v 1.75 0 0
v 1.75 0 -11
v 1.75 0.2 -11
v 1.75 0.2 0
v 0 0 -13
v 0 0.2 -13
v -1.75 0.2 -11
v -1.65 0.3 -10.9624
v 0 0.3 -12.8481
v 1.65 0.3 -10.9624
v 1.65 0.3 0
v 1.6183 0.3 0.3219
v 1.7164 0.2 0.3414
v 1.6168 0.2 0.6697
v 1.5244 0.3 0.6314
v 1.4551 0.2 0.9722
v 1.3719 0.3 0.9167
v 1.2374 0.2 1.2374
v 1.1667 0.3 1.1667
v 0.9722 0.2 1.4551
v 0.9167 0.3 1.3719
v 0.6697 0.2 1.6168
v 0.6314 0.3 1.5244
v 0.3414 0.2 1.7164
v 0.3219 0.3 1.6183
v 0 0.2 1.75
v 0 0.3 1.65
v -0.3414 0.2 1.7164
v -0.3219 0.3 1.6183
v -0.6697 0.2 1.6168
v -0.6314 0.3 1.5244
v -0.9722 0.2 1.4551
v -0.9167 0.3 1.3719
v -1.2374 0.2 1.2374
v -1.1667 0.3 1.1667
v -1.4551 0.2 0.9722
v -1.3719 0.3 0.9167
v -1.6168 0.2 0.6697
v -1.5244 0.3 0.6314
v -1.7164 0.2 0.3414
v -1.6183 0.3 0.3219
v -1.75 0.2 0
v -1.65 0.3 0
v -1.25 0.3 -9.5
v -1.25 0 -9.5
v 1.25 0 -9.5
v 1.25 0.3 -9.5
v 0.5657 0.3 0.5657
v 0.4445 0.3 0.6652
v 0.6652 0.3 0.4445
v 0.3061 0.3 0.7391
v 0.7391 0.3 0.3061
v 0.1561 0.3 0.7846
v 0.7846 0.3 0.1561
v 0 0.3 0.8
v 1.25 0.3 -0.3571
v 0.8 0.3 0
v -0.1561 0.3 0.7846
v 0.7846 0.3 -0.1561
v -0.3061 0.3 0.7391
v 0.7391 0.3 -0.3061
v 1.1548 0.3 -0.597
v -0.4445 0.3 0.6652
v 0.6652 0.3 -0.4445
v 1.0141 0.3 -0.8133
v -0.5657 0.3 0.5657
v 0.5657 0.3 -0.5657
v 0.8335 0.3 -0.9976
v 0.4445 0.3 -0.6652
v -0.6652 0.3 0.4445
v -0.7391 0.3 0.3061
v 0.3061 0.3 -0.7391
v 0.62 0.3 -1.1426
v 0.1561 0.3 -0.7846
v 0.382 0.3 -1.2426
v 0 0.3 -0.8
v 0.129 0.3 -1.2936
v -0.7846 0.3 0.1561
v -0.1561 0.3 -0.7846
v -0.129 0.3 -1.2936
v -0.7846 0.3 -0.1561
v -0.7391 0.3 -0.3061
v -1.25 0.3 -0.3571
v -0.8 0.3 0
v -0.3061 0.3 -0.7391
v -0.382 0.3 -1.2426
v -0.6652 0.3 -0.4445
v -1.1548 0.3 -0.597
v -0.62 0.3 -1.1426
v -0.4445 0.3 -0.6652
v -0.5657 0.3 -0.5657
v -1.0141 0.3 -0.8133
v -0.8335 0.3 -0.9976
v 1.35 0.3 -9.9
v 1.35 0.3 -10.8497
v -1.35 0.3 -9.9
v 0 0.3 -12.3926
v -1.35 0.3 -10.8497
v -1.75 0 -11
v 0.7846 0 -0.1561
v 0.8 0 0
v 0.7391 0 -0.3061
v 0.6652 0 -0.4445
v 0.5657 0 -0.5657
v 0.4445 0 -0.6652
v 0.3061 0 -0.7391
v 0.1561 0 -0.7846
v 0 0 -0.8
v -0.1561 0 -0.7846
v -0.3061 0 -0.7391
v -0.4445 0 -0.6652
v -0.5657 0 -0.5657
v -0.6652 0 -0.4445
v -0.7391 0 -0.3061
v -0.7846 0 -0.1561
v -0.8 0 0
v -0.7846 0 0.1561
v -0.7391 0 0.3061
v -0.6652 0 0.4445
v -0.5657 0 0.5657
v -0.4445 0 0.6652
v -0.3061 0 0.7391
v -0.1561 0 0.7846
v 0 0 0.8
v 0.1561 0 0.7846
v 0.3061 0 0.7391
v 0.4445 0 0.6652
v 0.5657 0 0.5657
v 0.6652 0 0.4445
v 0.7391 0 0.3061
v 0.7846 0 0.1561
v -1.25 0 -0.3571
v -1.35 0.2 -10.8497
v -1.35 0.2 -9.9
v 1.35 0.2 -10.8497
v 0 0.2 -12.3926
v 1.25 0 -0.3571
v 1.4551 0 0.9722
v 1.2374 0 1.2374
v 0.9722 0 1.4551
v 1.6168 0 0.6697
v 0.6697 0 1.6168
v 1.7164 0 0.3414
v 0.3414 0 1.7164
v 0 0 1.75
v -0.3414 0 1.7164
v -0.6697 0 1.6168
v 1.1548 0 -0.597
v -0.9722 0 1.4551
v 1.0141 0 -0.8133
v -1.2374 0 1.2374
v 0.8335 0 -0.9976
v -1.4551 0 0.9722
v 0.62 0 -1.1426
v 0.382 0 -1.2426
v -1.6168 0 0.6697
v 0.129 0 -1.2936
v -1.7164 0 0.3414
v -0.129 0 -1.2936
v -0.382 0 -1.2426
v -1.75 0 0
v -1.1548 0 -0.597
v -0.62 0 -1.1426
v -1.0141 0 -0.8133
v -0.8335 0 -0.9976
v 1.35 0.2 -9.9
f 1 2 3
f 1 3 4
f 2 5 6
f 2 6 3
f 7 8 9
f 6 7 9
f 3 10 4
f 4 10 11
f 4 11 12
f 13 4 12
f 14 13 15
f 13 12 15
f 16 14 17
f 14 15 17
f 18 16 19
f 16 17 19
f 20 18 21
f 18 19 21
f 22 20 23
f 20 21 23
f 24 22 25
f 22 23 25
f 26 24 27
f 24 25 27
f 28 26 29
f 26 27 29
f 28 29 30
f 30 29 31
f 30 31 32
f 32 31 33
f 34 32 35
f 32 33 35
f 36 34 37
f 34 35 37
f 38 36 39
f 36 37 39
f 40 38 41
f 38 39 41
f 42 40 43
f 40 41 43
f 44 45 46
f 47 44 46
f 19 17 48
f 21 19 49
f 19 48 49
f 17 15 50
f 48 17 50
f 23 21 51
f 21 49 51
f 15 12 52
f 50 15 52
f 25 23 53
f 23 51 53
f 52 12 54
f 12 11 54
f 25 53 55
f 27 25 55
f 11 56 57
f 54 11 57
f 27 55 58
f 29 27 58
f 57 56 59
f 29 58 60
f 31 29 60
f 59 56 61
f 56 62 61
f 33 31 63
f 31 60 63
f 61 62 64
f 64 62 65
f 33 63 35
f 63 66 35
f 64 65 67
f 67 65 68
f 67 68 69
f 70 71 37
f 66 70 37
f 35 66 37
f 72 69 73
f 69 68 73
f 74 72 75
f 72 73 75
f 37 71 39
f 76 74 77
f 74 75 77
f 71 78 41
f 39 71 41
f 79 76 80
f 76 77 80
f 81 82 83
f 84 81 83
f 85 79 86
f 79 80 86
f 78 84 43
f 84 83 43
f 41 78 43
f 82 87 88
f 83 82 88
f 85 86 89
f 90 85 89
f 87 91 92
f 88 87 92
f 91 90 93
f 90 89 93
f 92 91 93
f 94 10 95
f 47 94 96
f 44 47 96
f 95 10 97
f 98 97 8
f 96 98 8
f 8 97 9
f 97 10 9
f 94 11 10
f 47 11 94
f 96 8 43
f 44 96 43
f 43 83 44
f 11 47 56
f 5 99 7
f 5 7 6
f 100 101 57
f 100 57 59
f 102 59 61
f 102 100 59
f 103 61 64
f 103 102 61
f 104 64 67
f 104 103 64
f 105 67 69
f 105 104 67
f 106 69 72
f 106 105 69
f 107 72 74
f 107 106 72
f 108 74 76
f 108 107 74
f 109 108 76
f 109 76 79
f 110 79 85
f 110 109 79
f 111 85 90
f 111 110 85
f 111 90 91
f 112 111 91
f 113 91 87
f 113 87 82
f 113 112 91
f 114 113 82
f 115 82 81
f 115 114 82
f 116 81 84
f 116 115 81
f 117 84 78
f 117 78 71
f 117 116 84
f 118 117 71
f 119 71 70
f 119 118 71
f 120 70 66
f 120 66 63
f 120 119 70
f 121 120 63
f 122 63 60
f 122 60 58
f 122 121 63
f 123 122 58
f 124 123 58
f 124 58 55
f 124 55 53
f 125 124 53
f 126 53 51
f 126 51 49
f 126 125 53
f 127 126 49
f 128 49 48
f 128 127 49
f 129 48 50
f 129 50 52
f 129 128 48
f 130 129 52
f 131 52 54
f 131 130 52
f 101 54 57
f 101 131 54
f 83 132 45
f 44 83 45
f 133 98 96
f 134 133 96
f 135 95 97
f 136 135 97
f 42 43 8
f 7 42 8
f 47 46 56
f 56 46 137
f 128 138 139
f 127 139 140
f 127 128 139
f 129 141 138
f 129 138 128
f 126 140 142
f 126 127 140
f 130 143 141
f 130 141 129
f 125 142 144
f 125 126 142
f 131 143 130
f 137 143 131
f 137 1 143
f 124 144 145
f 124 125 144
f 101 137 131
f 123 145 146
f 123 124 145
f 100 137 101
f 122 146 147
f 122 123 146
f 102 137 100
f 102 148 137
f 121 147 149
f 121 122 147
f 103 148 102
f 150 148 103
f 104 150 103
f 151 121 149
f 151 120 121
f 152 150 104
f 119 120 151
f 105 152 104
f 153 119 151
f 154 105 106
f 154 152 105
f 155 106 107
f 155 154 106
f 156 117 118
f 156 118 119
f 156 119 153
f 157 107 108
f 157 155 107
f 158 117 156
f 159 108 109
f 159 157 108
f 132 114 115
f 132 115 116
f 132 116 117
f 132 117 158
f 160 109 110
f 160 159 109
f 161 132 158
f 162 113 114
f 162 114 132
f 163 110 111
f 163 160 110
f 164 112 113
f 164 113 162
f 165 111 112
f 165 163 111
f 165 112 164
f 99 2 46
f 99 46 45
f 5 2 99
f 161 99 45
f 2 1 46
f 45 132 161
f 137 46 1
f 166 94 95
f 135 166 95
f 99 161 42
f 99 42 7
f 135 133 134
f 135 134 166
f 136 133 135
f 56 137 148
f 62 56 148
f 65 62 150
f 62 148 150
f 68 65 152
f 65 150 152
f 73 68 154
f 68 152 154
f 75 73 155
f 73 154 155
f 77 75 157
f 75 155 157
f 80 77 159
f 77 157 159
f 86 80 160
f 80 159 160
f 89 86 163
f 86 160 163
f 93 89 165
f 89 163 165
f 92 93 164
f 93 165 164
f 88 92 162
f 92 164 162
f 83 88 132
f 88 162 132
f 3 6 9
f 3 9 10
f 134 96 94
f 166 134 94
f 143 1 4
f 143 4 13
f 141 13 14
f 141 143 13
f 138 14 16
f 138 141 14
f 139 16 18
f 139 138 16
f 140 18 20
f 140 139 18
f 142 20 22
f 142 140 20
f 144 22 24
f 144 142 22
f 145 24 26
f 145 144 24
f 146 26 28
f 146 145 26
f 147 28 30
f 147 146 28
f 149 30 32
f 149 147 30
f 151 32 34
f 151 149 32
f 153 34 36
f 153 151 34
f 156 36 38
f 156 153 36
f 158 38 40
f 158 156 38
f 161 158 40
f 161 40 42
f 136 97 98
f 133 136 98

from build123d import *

# Parameters (mm, degrees)
SKETCH1_R           = 0.8
BOSS_EXTRUDE1_DEPTH = 0.3
CUT_EXTRUDE1_DEPTH  = 0.1
CHAMFER1_SIZE       = 0.1


with BuildPart() as part:
    # Sketch1 → Boss-Extrude1 (new body)
    with BuildSketch(Plane(origin=(0, 0, 0), x_dir=(1, 0, 0), z_dir=(0, 1, 0))):
        with BuildLine():
            Line((-1.75, 0), (-1.75, 11))
            Line((-1.75, 11), (0, 13))
            Line((0, 13), (1.75, 11))
            Line((1.75, 11), (1.75, 0))
            ThreePointArc((1.75, 0), (0, -1.75), (-1.75, 0))
        make_face()
        Circle(SKETCH1_R, mode=Mode.SUBTRACT)
        with BuildLine():
            Line((-1.25, 0.357071421), (-1.25, 9.5))
            Line((-1.25, 9.5), (1.25, 9.5))
            Line((1.25, 9.5), (1.25, 0.357071421))
            ThreePointArc((1.25, 0.357071421), (0, 1.3), (-1.25, 0.357071421))
        make_face(mode=Mode.SUBTRACT)
    extrude(amount=BOSS_EXTRUDE1_DEPTH)

    # Sketch2 → Cut-Extrude1 (cut)
    with BuildSketch(Plane(origin=(0, 0.3, 0), x_dir=(1, 0, 0), z_dir=(0, 1, 0))):
        Polygon((-1.35, 10.849705954), (-1.35, 9.9), (1.35, 9.9), (1.35, 10.849705954), (0, 12.392563096), align=None)
    extrude(amount=-CUT_EXTRUDE1_DEPTH, mode=Mode.SUBTRACT)

    # Chamfer1
    chamfer1_edges = [part.edges().sort_by_distance(p)[0] for p in [
        (0.875, 0.3, -12),
        (-0.875, 0.3, -12),
        (-1.75, 0.3, -5.5),
        (0, 0.3, 1.75),
        (1.75, 0.3, -5.5),
    ]]
    chamfer(chamfer1_edges, length=CHAMFER1_SIZE)


solid = part.part
